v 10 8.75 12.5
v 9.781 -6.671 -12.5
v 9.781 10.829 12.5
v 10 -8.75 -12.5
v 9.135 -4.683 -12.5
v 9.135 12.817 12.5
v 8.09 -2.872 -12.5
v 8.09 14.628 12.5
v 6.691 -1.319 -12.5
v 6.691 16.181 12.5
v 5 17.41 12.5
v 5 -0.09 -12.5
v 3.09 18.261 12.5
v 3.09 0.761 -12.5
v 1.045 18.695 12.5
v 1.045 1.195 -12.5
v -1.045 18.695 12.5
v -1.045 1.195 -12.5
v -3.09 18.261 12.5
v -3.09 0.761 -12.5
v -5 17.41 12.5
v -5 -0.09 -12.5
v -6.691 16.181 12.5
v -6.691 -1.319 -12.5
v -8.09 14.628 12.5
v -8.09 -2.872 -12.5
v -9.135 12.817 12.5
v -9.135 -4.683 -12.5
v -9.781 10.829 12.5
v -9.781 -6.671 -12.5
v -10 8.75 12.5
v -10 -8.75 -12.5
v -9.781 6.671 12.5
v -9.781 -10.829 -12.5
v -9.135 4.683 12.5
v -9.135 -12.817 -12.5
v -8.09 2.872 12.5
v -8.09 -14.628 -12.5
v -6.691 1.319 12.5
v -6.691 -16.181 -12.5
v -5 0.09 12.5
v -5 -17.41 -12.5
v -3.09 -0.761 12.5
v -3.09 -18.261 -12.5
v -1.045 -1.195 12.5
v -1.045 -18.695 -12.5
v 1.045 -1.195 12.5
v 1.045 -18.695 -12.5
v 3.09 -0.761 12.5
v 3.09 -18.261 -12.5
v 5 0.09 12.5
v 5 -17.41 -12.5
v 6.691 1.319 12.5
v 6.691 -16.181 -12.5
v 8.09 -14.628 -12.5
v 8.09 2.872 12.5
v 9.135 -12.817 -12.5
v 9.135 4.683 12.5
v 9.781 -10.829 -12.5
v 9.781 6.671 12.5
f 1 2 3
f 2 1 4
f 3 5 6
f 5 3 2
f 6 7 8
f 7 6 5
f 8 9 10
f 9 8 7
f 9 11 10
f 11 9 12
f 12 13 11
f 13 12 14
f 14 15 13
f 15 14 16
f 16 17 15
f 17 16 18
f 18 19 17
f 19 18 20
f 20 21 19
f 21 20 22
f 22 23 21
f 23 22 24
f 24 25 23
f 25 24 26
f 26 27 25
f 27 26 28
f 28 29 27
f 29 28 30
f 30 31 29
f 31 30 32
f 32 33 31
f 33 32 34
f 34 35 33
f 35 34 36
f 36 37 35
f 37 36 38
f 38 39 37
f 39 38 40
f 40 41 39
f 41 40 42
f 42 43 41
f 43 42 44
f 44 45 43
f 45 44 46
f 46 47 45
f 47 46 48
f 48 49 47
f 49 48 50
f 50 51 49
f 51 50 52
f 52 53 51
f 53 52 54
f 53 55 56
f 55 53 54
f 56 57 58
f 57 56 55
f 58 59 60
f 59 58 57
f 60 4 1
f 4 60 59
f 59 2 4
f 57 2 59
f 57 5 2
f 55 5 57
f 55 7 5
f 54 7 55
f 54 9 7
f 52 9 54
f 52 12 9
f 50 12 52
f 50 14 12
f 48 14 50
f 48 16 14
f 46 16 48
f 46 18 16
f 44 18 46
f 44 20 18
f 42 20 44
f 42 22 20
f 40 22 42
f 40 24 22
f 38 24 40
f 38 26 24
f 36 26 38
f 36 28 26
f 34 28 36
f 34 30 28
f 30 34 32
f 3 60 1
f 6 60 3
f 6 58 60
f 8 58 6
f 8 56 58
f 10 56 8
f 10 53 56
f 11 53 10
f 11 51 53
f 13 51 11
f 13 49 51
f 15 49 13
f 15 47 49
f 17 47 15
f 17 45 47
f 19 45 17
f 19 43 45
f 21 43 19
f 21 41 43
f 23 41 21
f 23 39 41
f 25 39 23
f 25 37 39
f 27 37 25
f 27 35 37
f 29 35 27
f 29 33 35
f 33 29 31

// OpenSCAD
multmatrix(m=[[1, 0, 0, 0], [0, 1, 0.7, 0], [0, 0, 1, 0], [0, 0, 0, 1]]) {
    cylinder(r=10, h=25, center=true);
};
